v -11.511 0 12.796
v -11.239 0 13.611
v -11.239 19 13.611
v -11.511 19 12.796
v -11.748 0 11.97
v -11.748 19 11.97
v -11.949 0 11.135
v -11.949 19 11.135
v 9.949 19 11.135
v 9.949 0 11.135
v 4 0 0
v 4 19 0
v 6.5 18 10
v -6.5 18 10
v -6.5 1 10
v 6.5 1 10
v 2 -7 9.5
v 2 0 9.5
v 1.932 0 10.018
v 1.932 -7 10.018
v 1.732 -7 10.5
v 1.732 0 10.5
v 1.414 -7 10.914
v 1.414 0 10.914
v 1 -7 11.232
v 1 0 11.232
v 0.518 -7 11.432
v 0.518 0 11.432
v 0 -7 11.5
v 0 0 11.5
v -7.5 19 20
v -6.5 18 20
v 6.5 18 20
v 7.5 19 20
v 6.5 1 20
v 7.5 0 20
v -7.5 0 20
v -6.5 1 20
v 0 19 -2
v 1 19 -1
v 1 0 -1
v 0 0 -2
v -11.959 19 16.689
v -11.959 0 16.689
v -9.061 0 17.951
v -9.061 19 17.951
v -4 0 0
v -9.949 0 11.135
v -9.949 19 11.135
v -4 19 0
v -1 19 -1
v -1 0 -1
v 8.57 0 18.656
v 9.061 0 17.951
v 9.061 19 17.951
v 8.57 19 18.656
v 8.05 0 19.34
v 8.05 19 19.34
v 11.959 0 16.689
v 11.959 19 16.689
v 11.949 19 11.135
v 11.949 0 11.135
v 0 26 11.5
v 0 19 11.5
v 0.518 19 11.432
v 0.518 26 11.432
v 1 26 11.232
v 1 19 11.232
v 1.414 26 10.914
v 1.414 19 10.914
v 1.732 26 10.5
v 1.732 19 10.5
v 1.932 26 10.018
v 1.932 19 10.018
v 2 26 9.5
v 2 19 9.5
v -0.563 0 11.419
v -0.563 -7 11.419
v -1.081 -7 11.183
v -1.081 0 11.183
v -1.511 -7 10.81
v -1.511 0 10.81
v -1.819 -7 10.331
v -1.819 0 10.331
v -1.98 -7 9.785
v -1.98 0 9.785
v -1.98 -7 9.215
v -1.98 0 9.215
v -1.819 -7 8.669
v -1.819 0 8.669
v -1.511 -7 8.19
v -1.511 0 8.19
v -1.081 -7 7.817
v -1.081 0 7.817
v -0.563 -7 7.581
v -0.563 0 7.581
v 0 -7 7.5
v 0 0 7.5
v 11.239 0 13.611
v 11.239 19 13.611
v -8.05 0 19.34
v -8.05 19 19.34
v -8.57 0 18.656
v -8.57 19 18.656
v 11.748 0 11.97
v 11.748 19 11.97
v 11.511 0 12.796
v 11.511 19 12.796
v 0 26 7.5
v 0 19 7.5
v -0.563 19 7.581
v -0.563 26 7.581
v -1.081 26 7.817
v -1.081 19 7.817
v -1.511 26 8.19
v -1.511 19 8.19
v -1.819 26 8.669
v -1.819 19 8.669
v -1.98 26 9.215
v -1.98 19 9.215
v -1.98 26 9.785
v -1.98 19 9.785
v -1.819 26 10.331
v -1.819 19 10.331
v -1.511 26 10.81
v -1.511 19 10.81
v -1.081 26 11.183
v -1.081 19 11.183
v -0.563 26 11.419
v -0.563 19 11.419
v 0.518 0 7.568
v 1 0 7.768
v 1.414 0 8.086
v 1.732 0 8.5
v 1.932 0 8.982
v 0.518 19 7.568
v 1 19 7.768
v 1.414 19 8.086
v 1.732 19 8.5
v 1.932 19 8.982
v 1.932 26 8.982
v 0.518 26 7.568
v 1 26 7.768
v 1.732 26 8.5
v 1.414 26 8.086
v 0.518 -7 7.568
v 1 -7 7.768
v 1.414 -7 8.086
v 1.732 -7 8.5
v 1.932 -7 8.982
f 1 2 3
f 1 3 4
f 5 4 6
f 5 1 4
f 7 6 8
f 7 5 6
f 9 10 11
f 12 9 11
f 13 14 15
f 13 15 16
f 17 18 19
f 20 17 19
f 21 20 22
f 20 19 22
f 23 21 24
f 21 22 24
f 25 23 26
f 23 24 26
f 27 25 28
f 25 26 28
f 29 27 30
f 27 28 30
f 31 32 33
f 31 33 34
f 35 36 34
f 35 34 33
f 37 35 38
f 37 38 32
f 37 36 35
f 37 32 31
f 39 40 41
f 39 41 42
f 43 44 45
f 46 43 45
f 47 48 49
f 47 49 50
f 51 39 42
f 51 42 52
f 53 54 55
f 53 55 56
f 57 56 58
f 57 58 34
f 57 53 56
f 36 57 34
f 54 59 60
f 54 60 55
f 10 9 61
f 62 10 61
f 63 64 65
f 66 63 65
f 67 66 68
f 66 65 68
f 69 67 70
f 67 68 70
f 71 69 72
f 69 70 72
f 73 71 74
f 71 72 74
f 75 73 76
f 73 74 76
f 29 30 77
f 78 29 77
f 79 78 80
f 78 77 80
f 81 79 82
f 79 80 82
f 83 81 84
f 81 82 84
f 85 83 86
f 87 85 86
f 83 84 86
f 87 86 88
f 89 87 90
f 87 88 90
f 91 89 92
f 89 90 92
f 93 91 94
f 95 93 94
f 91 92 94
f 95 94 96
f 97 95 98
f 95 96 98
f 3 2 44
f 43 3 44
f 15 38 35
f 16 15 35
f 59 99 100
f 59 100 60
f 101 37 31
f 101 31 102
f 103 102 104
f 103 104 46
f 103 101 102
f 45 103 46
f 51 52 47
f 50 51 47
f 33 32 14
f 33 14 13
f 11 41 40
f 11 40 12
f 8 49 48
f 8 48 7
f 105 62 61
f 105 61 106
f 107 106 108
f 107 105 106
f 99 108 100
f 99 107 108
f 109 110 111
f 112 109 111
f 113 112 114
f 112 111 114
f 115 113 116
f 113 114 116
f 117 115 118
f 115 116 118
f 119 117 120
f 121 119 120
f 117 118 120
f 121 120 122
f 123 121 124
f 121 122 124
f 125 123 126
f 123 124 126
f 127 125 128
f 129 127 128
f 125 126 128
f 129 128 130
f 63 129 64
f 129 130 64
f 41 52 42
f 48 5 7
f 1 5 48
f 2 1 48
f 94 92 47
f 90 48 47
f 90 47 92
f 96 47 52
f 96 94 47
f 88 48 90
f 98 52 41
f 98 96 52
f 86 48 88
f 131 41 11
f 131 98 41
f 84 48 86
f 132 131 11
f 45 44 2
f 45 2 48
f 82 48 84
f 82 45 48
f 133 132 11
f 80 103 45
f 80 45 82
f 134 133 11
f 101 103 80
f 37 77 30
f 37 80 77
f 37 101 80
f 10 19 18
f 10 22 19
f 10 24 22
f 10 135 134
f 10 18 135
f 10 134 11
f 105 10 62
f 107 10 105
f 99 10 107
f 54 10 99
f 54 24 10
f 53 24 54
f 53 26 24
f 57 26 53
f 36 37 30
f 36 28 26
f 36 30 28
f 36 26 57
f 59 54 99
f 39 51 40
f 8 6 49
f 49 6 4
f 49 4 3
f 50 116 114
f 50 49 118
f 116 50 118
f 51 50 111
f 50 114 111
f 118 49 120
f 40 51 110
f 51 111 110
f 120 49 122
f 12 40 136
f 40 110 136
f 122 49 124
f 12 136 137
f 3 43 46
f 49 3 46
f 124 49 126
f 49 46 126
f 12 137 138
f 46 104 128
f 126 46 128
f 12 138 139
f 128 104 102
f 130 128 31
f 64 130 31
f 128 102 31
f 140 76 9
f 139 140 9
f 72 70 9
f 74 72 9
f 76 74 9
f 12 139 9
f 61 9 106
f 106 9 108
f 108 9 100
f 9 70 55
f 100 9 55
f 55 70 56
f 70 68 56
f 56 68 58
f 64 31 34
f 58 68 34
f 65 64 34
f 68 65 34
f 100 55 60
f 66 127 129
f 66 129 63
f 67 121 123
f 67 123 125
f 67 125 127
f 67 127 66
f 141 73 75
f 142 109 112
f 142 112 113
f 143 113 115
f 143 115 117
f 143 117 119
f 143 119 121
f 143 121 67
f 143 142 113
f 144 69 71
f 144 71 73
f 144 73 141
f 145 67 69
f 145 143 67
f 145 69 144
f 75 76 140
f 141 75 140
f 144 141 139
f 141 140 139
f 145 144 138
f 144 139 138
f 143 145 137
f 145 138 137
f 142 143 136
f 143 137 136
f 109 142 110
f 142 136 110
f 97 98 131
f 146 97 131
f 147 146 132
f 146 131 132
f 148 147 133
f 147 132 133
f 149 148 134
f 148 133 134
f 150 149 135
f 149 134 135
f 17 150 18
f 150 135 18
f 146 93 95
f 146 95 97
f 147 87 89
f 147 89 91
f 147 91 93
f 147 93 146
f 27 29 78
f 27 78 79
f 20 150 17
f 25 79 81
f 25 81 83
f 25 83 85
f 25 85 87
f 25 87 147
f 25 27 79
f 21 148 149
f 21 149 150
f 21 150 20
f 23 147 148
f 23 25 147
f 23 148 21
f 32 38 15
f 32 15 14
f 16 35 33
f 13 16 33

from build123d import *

# Parameters (mm, degrees)
BOSS_EXTRUDE1_DEPTH = 19
BOSS_EXTRUDE2_DEPTH = 7
BOSS_EXTRUDE3_DEPTH = 7
BOSS_EXTRUDE4_DEPTH = 19
CUT_EXTRUDE1_DEPTH  = 19
CUT_EXTRUDE2_DEPTH  = 19
BOSS_EXTRUDE5_DEPTH = 19
BOSS_EXTRUDE6_DEPTH = 19
BOSS_EXTRUDE7_DEPTH = 19
BOSS_EXTRUDE8_DEPTH = 19
BOSS_EXTRUDE9_DEPTH = 19
SKETCH14_W          = 13
SKETCH14_H          = 17
CUT_EXTRUDE3_DEPTH  = 10


with BuildPart() as part:
    # Sketch1 → Boss-Extrude1 (new body)
    with BuildSketch(Plane(origin=(0, 0, 0), x_dir=(1, 0, 0), z_dir=(0, 1, 0))):
        Polygon((4, 0), (7.5, -20), (-7.5, -20), (-4, 0), align=None)
        Polygon((-7.5, -20), (-5.948577014, -11.134725796), (-10.948577014, -11.134725796), (-9.949358248, -13.703422483), (-9.224288507, -15.567362898), (-8.499218766, -17.431303313), align=None)
        Polygon((-9.224288507, -15.567362898), (-9.949358248, -13.703422483), (-11.088228922, -16.292432639), align=None)
        Polygon((-11.088228922, -16.292432639), (-8.499218766, -17.431303313), (-9.224288507, -15.567362898), align=None)
        Polygon((5.948577014, -11.134725796), (7.5, -20), (8.499218766, -17.431303313), (9.224288507, -15.567362898), (9.949358248, -13.703422483), (10.948577014, -11.134725796), align=None)
        Polygon((9.949358248, -13.703422483), (9.224288507, -15.567362898), (11.088228922, -16.292432639), align=None)
        Polygon((9.224288507, -15.567362898), (8.499218766, -17.431303313), (11.088228922, -16.292432639), align=None)
        Polygon((0, 1), (-2, 0), (2, 0), align=None)
    extrude(amount=BOSS_EXTRUDE1_DEPTH)

    # Sketch2 → Boss-Extrude2 (add)
    with BuildSketch(Plane(origin=(0, 19, 0), x_dir=(1, 0, 0), z_dir=(0, 1, 0))):
        with BuildLine():
            ThreePointArc((2, -9.5), (1.414213562, -8.085786438), (0, -7.5))
            Line((0, -7.5), (0, -11.5))
            ThreePointArc((0, -11.5), (1.414213562, -10.914213562), (2, -9.5))
        make_face()
        with BuildLine():
            Line((0, -11.5), (0, -7.5))
            ThreePointArc((0, -7.5), (-2, -9.5), (0, -11.5))
        make_face()
    extrude(amount=BOSS_EXTRUDE2_DEPTH)

    # Sketch3 → Boss-Extrude3 (add)
    with BuildSketch(Plane.XZ):
        with BuildLine():
            ThreePointArc((0, 11.5), (-2, 9.5), (0, 7.5))
            Line((0, 7.5), (0, 11.5))
        make_face()
        with BuildLine():
            Line((0, 11.5), (0, 7.5))
            ThreePointArc((0, 7.5), (1.414213562, 8.085786438), (2, 9.5))
            ThreePointArc((2, 9.5), (1.414213562, 10.914213562), (0, 11.5))
        make_face()
    extrude(amount=BOSS_EXTRUDE3_DEPTH)

    # Sketch4 → Boss-Extrude4 (add)
    with BuildSketch(Plane.XZ):
        Polygon((9.948577014, 11.134725796), (4, 0), (5.948577014, 11.134725796), align=None)
        Polygon((-5.948577014, 11.134725796), (-9.948577014, 11.134725796), (-4, 0), align=None)
    extrude(amount=-BOSS_EXTRUDE4_DEPTH)

    # Sketch5 → Cut-Extrude1 (cut)
    with BuildSketch(Plane.XZ):
        Polygon((9.949358248, 13.703422483), (8.499218766, 17.431303313), (11.088228922, 16.292432639), align=None)
    extrude(amount=-CUT_EXTRUDE1_DEPTH, mode=Mode.SUBTRACT)

    # Sketch6 → Cut-Extrude2 (cut)
    with BuildSketch(Plane.XZ):
        Polygon((-9.949358248, 13.703422483), (-8.499218766, 17.431303313), (-11.088228922, 16.292432639), align=None)
    extrude(amount=-CUT_EXTRUDE2_DEPTH, mode=Mode.SUBTRACT)

    # Sketch7 → Boss-Extrude5 (add)
    with BuildSketch(Plane.XZ):
        Polygon((10.948577014, 11.134725796), (11.948577014, 11.134725796), (7.5, 20), align=None)
        Polygon((-11.948577014, 11.134725796), (-7.5, 20), (-10.948577014, 11.134725796), align=None)
    extrude(amount=-BOSS_EXTRUDE5_DEPTH)

    # Sketch8 → Boss-Extrude6 (add)
    with BuildSketch(Plane.XZ):
        Polygon((2, 0), (0, -2), (-2, 0), (0, -1), align=None)
    extrude(amount=-BOSS_EXTRUDE6_DEPTH)

    # Sketch9 → Boss-Extrude7 (add)
    with BuildSketch(Plane.XZ):
        Polygon((-1, -1), (-4, 0), (-2, 0), align=None)
        Polygon((1, -1), (4, 0), (2, 0), align=None)
    extrude(amount=-BOSS_EXTRUDE7_DEPTH)

    # Sketch10 → Boss-Extrude8 (add)
    with BuildSketch(Plane.XZ):
        Polygon((11.069784798, 12.886012542), (11.958747137, 16.688609807), (8.378792216, 18.248713254), align=None)
        Polygon((-8.378792216, 18.248713254), (-11.069784798, 12.886012542), (-11.958747137, 16.688609807), align=None)
    extrude(amount=-BOSS_EXTRUDE8_DEPTH)

    # Sketch13 → Boss-Extrude9 (add)
    with BuildSketch(Plane.XZ):
        with BuildLine():
            Line((11.069784798, 12.886012542), (11.948577014, 11.134725796))
            ThreePointArc((11.948577014, 11.134725796), (11.633851427, 12.384363188), (11.239303029, 13.61113838))
            Line((11.239303029, 13.61113838), (11.069784798, 12.886012542))
        make_face()
        with BuildLine():
            Line((7.5, 20), (8.378792216, 18.248713254))
            Line((8.378792216, 18.248713254), (9.061461884, 17.951213613))
            ThreePointArc((9.061461884, 17.951213613), (8.313750457, 19.000772297), (7.5, 20))
        make_face()
        with BuildLine():
            Line((-9.061461884, 17.951213613), (-8.378792216, 18.248713254))
            Line((-8.378792216, 18.248713254), (-7.5, 20))
            ThreePointArc((-7.5, 20), (-8.313750457, 19.000772297), (-9.061461884, 17.951213613))
        make_face()
        with BuildLine():
            ThreePointArc((-11.239303029, 13.61113838), (-11.633851427, 12.384363188), (-11.948577014, 11.134725796))
            Line((-11.948577014, 11.134725796), (-11.069784798, 12.886012542))
            Line((-11.069784798, 12.886012542), (-11.239303029, 13.61113838))
        make_face()
    extrude(amount=-BOSS_EXTRUDE9_DEPTH)

    # Sketch14 → Cut-Extrude3 (cut)
    with BuildSketch(Plane.XY.offset(20)):
        with Locations((0, 9.5)):
            Rectangle(SKETCH14_W, SKETCH14_H)
    extrude(amount=-CUT_EXTRUDE3_DEPTH, mode=Mode.SUBTRACT)


solid = part.part
